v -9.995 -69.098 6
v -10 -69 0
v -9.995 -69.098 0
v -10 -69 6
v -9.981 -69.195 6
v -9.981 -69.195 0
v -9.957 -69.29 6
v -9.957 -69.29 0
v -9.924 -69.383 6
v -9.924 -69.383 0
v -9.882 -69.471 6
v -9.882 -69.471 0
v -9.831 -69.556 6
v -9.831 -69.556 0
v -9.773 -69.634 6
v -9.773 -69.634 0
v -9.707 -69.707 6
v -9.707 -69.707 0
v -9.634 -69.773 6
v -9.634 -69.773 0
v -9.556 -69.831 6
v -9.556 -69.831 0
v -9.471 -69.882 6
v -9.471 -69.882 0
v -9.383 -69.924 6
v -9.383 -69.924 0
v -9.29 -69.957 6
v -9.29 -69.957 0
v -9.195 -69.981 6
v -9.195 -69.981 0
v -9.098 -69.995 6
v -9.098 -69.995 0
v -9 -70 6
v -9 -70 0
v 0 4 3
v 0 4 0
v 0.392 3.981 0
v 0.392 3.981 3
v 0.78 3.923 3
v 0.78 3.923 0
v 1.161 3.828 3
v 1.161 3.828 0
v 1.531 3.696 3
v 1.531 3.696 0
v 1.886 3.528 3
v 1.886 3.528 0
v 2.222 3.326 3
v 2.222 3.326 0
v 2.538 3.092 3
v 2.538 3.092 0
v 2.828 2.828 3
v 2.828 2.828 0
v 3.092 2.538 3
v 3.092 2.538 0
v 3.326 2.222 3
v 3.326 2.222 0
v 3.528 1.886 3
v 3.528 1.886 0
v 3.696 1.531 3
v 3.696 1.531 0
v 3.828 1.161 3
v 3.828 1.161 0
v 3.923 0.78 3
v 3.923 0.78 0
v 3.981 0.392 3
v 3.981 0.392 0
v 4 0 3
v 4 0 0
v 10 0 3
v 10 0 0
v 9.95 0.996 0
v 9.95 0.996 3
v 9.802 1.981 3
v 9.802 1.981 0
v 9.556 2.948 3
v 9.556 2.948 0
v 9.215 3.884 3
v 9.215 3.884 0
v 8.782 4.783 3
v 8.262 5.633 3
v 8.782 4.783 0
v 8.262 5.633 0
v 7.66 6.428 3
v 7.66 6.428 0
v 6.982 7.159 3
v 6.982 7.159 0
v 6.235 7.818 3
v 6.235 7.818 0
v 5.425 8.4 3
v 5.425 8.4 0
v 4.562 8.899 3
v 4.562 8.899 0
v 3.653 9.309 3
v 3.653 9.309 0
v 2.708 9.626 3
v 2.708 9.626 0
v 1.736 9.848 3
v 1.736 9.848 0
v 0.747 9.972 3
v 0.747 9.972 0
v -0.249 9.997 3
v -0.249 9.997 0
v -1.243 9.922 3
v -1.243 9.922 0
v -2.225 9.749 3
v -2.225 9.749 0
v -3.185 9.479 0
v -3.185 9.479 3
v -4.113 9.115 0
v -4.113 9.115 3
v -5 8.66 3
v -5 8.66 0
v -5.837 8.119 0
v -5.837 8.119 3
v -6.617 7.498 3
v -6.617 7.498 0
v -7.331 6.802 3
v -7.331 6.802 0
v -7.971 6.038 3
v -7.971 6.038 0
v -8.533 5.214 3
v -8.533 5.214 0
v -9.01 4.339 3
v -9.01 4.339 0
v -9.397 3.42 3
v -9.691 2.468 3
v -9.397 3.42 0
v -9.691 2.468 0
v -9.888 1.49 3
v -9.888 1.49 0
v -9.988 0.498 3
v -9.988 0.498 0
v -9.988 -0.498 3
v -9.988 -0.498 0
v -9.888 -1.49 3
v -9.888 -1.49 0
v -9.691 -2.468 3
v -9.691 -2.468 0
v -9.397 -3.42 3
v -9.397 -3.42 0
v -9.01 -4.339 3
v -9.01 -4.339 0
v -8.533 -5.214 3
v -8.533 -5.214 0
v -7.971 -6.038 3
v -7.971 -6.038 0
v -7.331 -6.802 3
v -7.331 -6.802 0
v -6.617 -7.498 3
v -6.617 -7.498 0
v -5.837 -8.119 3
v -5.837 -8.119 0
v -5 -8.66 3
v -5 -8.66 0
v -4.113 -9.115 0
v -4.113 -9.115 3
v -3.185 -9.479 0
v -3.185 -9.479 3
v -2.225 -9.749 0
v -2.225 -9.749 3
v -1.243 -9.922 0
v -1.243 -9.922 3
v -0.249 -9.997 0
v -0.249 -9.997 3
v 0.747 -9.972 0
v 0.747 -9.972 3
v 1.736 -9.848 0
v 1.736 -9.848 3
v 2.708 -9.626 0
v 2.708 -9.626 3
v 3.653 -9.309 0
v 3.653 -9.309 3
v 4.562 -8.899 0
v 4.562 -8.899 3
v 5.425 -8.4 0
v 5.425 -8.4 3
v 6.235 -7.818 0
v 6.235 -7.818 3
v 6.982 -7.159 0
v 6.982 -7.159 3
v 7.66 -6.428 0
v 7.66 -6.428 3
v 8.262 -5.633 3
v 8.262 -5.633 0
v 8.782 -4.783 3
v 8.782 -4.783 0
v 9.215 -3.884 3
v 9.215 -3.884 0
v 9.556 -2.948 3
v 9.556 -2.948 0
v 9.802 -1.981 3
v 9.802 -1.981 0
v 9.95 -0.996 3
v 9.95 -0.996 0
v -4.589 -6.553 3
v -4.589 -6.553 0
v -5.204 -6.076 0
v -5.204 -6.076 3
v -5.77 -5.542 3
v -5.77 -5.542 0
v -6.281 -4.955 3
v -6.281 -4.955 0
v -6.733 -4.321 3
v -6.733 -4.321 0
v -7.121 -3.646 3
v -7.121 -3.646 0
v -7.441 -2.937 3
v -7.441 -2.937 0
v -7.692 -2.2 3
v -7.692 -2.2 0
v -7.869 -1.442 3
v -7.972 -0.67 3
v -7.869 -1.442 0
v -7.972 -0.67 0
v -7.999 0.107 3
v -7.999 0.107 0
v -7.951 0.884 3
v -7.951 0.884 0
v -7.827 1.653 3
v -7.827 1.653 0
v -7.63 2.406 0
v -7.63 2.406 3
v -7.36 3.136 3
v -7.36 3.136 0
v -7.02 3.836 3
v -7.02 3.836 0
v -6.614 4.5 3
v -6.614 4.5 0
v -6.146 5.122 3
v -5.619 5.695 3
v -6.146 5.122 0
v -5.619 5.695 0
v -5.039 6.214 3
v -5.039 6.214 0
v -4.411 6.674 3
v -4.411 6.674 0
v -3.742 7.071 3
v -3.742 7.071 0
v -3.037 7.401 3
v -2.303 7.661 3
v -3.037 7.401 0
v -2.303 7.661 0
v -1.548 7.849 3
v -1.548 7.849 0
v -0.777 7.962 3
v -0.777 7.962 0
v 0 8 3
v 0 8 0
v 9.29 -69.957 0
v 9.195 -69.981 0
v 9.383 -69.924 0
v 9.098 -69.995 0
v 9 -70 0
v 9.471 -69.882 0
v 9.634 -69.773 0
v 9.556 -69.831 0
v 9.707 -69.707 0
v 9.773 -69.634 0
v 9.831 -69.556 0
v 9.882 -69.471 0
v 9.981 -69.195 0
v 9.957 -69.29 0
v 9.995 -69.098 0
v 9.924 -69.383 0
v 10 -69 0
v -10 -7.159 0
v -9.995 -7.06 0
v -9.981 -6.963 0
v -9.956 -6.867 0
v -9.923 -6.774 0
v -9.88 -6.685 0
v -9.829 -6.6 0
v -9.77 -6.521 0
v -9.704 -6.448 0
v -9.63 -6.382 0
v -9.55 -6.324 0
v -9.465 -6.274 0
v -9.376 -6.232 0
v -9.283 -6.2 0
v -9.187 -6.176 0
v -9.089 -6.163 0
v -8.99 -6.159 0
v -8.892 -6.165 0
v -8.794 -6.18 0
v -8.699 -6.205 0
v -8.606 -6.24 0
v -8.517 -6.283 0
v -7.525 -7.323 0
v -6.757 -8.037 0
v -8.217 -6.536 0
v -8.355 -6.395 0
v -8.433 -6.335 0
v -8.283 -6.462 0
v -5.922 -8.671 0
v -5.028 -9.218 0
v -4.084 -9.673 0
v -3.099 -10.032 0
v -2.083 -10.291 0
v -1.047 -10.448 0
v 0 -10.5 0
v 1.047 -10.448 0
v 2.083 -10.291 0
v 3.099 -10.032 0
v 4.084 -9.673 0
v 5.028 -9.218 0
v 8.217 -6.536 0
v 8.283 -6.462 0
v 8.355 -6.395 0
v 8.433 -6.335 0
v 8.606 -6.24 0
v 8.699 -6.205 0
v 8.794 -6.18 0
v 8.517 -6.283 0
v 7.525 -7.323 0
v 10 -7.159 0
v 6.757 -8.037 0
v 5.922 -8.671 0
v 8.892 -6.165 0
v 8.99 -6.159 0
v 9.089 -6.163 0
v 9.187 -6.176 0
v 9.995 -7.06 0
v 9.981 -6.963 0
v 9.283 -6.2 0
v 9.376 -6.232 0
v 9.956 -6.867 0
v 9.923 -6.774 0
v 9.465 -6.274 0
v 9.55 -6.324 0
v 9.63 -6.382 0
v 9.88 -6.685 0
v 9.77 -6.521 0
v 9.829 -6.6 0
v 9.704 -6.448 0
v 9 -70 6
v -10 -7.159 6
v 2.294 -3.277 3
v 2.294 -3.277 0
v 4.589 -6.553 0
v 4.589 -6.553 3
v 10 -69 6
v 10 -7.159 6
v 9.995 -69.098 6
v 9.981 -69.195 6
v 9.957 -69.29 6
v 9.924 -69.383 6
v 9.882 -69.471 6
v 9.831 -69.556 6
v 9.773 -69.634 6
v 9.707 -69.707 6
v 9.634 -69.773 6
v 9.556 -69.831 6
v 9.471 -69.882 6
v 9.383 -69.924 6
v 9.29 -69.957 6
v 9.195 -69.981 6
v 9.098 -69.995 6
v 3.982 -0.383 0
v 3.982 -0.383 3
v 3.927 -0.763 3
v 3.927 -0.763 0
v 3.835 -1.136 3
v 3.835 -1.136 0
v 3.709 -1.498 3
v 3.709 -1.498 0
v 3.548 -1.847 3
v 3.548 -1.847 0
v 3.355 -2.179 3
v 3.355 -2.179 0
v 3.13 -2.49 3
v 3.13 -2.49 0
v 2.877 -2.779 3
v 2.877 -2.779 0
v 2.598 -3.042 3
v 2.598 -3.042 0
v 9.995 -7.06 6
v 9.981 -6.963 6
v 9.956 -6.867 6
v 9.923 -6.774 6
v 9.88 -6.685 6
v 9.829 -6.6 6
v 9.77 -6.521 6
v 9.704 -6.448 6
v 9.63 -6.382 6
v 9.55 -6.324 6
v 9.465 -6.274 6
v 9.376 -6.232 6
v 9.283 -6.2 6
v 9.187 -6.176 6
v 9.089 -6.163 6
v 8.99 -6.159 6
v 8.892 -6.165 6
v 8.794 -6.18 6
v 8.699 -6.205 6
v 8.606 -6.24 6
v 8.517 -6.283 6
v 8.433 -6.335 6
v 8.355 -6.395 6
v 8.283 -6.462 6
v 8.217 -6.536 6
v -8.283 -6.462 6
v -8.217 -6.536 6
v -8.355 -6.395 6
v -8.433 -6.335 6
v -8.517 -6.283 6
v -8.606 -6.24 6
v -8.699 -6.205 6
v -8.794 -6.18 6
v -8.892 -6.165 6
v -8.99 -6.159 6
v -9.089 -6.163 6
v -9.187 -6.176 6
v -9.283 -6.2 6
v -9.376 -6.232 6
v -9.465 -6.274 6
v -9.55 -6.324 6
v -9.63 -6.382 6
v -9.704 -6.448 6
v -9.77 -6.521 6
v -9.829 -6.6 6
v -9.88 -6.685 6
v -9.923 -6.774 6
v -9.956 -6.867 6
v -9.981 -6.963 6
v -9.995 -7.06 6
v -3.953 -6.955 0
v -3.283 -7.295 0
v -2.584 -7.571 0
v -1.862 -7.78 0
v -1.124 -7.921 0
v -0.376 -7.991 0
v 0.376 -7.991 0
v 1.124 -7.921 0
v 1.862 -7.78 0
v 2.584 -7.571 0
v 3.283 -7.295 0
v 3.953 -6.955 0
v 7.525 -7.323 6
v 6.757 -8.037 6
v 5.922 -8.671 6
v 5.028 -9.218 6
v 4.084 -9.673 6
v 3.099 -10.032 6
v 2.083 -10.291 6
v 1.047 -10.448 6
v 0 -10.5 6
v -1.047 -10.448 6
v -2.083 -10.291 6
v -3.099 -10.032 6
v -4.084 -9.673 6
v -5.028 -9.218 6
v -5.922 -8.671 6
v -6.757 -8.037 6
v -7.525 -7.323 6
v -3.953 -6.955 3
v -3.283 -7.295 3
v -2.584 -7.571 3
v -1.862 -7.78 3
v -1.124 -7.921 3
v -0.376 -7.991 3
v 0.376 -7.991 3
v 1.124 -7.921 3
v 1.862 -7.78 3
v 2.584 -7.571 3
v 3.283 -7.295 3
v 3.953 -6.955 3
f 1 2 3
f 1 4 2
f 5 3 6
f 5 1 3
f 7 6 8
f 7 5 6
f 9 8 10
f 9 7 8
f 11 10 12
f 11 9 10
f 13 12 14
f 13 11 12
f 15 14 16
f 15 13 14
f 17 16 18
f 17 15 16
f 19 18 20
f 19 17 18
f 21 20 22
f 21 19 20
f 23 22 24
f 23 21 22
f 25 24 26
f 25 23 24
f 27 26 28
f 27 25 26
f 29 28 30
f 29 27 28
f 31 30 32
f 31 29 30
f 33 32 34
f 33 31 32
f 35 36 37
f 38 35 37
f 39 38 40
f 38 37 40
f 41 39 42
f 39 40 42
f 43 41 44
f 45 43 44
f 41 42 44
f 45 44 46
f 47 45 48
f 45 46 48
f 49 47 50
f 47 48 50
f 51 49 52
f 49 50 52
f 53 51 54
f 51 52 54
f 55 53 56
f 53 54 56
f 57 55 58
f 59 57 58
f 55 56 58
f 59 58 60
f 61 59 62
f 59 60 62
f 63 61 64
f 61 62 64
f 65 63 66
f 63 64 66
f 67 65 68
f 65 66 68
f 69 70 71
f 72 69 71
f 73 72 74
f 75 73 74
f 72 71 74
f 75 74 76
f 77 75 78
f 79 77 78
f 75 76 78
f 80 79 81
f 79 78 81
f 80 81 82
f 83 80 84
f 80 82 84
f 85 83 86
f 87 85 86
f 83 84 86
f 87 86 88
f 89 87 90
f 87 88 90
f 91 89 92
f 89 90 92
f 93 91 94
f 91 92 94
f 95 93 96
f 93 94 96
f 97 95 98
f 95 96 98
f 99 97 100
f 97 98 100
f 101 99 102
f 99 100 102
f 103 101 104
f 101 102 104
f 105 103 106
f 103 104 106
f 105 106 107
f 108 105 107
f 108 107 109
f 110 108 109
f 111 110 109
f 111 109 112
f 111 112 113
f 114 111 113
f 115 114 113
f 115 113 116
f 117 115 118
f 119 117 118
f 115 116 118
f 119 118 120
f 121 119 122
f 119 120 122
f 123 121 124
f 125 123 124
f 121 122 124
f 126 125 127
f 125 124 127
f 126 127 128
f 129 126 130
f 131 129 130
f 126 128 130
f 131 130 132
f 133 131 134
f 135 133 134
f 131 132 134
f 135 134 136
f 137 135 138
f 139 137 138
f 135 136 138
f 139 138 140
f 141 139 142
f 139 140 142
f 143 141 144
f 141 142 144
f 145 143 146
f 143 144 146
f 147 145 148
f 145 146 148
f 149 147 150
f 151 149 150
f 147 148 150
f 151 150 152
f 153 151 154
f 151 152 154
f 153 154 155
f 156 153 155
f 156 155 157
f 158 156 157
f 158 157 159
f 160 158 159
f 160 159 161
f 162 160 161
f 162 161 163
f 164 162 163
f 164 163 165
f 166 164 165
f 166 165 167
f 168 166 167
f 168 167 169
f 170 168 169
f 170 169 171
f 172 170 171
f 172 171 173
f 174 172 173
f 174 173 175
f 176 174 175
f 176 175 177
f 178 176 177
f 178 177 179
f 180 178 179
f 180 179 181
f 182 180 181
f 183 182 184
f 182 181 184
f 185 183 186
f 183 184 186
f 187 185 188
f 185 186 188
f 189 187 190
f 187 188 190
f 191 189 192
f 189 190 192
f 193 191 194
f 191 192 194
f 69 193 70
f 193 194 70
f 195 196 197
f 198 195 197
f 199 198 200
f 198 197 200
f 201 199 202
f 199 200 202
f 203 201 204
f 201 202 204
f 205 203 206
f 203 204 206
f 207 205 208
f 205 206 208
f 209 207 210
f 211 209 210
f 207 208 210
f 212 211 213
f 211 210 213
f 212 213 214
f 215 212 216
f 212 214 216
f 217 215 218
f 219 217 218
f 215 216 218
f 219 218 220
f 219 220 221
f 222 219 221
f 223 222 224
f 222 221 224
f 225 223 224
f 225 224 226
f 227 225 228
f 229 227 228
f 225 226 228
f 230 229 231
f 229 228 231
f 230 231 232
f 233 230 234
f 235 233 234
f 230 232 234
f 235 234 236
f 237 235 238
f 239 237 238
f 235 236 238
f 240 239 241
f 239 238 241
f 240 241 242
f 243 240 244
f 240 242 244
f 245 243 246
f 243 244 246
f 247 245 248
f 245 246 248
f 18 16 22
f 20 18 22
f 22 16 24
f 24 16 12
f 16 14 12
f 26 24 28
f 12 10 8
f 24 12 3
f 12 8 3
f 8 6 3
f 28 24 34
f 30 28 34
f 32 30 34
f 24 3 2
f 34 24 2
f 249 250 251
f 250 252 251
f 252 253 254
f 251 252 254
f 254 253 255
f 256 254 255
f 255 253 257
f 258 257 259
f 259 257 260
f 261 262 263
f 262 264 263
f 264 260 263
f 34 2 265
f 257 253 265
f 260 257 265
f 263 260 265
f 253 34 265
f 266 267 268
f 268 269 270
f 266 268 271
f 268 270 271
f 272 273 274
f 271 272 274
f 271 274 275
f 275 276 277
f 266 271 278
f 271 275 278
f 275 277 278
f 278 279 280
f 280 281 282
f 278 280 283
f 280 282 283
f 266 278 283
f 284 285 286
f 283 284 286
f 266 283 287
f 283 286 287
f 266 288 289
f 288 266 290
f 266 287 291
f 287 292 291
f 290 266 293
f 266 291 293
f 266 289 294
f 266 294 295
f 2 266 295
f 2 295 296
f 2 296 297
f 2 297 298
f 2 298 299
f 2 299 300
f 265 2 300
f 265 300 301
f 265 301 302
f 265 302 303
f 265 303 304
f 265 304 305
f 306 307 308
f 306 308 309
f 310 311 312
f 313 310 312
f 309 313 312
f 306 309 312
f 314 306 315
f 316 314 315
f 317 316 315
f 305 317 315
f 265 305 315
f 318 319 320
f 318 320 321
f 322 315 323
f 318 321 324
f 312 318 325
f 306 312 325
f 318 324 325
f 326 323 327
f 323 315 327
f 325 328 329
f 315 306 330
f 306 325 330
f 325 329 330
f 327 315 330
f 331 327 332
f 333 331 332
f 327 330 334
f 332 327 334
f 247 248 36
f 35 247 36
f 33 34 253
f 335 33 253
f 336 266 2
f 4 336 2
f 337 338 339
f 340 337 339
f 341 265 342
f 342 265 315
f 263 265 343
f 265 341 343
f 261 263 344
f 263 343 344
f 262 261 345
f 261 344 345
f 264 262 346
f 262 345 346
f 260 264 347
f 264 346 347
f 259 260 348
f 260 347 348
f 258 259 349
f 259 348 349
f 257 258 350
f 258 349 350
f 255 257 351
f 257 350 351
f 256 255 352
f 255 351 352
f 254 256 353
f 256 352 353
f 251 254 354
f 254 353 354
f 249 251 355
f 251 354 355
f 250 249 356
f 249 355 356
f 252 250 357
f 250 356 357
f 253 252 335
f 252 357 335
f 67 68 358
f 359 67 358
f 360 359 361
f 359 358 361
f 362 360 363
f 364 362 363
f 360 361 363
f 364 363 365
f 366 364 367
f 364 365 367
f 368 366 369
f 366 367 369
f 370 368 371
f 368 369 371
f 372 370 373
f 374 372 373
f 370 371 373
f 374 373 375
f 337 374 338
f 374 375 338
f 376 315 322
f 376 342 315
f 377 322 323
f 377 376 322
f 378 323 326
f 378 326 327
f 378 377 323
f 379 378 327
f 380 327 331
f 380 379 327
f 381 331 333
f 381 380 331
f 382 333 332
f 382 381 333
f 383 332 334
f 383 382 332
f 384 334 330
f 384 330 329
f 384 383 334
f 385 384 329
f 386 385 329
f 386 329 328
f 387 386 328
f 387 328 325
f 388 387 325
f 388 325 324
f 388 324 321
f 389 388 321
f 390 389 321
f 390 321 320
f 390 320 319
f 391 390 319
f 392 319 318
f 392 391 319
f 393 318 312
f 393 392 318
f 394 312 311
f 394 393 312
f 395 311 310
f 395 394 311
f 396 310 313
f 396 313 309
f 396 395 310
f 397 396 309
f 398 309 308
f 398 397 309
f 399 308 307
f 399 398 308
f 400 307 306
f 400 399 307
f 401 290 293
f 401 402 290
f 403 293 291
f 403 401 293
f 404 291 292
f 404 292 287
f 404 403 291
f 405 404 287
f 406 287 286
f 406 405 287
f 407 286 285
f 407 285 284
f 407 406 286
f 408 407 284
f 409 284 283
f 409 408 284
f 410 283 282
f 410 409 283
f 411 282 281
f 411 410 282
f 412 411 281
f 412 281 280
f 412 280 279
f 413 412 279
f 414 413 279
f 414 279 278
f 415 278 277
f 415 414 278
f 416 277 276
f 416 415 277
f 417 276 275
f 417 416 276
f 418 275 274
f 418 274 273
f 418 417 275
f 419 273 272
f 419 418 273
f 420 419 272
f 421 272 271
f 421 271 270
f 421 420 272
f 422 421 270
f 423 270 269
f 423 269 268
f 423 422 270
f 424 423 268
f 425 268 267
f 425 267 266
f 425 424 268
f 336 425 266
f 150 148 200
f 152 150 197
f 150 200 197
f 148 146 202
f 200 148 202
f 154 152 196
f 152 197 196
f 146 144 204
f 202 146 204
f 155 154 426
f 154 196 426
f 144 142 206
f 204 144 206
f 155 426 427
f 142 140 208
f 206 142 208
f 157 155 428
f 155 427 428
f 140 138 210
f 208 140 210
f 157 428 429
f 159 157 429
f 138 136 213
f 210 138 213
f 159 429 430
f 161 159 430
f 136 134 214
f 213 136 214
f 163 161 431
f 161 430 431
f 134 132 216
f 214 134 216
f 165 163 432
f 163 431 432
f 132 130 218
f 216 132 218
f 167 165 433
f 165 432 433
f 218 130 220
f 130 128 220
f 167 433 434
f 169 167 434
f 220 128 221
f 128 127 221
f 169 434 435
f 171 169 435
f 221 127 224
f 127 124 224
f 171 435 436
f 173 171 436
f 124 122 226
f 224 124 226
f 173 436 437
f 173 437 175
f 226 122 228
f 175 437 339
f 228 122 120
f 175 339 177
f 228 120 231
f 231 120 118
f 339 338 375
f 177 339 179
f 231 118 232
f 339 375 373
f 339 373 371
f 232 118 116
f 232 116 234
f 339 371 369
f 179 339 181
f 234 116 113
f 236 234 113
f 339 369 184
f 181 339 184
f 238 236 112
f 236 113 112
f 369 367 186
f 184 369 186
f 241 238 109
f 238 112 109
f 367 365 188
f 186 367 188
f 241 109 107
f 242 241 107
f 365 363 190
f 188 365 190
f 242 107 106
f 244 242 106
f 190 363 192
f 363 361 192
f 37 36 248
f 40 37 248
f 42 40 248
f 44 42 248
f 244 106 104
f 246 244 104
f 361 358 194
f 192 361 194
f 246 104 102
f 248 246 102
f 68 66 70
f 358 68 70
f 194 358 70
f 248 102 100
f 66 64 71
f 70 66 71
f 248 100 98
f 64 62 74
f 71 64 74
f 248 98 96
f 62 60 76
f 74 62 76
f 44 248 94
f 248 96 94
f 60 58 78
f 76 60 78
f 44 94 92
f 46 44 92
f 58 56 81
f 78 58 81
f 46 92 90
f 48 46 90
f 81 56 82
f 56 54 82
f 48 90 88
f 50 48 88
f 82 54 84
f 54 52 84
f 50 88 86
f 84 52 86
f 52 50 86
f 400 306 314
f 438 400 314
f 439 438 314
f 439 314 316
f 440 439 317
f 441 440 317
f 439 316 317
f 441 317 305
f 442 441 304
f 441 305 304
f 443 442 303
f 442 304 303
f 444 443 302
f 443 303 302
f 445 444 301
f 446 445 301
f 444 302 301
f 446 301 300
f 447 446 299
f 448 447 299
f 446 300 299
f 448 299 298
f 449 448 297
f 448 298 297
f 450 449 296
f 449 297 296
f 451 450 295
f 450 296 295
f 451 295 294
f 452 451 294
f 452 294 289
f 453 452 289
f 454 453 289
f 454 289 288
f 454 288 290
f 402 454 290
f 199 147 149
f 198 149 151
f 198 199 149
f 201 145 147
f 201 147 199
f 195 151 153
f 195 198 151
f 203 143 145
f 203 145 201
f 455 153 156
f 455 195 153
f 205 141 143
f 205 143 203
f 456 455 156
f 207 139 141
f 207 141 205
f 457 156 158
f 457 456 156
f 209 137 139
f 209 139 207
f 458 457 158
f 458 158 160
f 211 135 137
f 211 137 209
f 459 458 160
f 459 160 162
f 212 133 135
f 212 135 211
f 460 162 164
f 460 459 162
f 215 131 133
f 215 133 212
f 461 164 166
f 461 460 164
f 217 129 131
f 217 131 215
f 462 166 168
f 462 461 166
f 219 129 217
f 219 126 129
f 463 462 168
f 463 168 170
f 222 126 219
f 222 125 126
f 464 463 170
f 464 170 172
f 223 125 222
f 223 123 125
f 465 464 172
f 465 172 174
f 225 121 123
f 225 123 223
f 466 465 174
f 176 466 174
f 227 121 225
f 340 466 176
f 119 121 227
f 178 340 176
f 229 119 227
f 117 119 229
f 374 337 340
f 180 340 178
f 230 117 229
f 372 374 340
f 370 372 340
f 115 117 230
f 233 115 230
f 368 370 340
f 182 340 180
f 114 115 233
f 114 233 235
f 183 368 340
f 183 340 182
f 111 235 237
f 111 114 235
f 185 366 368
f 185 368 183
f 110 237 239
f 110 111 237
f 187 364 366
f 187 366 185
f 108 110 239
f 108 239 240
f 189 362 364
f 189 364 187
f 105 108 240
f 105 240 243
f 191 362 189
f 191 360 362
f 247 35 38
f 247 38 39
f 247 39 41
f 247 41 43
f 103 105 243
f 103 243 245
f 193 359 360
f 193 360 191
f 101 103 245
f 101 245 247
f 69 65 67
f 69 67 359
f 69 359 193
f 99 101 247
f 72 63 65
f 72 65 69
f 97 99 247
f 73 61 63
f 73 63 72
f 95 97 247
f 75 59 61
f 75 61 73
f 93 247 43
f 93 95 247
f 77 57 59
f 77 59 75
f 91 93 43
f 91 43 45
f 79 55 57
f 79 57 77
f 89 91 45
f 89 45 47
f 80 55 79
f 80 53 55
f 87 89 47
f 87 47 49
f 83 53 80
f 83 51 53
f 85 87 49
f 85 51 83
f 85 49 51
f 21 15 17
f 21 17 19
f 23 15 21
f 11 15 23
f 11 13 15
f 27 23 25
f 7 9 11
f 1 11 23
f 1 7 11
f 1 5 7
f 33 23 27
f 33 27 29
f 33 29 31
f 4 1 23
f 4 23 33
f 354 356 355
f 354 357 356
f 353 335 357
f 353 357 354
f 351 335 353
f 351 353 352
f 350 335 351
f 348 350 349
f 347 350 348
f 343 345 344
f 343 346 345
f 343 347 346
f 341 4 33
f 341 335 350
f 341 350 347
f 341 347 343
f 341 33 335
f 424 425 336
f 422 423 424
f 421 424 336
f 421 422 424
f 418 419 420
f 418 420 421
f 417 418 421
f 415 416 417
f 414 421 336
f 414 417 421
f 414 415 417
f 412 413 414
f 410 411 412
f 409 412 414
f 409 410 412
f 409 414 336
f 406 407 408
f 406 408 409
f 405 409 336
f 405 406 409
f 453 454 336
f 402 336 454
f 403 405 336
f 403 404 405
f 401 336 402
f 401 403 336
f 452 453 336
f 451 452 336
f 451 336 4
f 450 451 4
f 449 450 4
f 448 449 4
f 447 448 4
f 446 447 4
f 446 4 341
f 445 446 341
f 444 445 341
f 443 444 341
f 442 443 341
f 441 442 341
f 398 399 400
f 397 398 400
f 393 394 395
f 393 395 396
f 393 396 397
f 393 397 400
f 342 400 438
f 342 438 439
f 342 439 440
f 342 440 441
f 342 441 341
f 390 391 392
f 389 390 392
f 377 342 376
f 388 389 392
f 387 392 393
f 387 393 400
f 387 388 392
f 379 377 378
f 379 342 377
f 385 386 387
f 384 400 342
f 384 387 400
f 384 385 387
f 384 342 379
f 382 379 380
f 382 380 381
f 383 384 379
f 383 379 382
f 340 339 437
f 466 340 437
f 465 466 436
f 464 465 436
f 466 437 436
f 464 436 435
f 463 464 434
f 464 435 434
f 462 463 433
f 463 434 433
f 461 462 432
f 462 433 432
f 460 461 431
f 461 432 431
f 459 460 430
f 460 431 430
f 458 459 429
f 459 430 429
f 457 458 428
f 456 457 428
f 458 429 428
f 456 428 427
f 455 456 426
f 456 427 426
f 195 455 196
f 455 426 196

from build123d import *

# Parameters (mm, degrees)
F1_DEPTH = 6
F2_DEPTH = 3
F3_R     = 1


with BuildPart() as f1:
    # F0 (on Top) → F1 (new body)
    with BuildSketch(Plane.XY):
        with BuildLine():
            Line((10, -70), (10, -3.2015621187))
            ThreePointArc((10, -3.2015621187), (0, -10.5), (-10, -3.2015621187))
            Line((-10, -3.2015621187), (-10, -70))
            Line((-10, -70), (10, -70))
        make_face()
    extrude(amount=F1_DEPTH)

    # F3
    f3_edges = [f1.edges().sort_by_distance(p)[0] for p in [
        (10, -70, 3),
        (-10, -70, 3),
        (10, -3.201562, 3),
        (-10, -3.201562, 3),
    ]]
    fillet(f3_edges, radius=F3_R)


with BuildPart() as f2:
    # F0 (on Top) → F2 (new body)
    with BuildSketch(Plane.XY):
        with BuildLine():
            ThreePointArc((-10, 0), (0, -10), (10, 0))
            ThreePointArc((10, 0), (0, 10), (-10, 0))
        make_face()
        with BuildLine():
            ThreePointArc((0, 8), (5.6568542495, 5.6568542495), (8, 0))
            ThreePointArc((8, 0), (7.0960866654, -3.6939889059), (4.5886114908, -6.5532163543))
            ThreePointArc((4.5886114908, -6.5532163543), (0, -8), (-4.5886114908, -6.5532163543))
            ThreePointArc((-4.5886114908, -6.5532163543), (-7.629735606, 2.405646396), (0, 8))
        make_face(mode=Mode.SUBTRACT)
        with BuildLine():
            ThreePointArc((4.5886114908, -6.5532163543), (7.0960866654, -3.6939889059), (8, 0))
            ThreePointArc((8, 0), (5.6568542495, 5.6568542495), (0, 8))
            Line((0, 8), (0, 4))
            ThreePointArc((0, 4), (2.8284271247, 2.8284271247), (4, 0))
            ThreePointArc((4, 0), (3.5480433327, -1.8469944529), (2.2943057454, -3.2766081772))
            Line((2.2943057454, -3.2766081772), (4.5886114908, -6.5532163543))
        make_face()
    extrude(amount=F2_DEPTH)


solid = Compound([f1.part, f2.part])
